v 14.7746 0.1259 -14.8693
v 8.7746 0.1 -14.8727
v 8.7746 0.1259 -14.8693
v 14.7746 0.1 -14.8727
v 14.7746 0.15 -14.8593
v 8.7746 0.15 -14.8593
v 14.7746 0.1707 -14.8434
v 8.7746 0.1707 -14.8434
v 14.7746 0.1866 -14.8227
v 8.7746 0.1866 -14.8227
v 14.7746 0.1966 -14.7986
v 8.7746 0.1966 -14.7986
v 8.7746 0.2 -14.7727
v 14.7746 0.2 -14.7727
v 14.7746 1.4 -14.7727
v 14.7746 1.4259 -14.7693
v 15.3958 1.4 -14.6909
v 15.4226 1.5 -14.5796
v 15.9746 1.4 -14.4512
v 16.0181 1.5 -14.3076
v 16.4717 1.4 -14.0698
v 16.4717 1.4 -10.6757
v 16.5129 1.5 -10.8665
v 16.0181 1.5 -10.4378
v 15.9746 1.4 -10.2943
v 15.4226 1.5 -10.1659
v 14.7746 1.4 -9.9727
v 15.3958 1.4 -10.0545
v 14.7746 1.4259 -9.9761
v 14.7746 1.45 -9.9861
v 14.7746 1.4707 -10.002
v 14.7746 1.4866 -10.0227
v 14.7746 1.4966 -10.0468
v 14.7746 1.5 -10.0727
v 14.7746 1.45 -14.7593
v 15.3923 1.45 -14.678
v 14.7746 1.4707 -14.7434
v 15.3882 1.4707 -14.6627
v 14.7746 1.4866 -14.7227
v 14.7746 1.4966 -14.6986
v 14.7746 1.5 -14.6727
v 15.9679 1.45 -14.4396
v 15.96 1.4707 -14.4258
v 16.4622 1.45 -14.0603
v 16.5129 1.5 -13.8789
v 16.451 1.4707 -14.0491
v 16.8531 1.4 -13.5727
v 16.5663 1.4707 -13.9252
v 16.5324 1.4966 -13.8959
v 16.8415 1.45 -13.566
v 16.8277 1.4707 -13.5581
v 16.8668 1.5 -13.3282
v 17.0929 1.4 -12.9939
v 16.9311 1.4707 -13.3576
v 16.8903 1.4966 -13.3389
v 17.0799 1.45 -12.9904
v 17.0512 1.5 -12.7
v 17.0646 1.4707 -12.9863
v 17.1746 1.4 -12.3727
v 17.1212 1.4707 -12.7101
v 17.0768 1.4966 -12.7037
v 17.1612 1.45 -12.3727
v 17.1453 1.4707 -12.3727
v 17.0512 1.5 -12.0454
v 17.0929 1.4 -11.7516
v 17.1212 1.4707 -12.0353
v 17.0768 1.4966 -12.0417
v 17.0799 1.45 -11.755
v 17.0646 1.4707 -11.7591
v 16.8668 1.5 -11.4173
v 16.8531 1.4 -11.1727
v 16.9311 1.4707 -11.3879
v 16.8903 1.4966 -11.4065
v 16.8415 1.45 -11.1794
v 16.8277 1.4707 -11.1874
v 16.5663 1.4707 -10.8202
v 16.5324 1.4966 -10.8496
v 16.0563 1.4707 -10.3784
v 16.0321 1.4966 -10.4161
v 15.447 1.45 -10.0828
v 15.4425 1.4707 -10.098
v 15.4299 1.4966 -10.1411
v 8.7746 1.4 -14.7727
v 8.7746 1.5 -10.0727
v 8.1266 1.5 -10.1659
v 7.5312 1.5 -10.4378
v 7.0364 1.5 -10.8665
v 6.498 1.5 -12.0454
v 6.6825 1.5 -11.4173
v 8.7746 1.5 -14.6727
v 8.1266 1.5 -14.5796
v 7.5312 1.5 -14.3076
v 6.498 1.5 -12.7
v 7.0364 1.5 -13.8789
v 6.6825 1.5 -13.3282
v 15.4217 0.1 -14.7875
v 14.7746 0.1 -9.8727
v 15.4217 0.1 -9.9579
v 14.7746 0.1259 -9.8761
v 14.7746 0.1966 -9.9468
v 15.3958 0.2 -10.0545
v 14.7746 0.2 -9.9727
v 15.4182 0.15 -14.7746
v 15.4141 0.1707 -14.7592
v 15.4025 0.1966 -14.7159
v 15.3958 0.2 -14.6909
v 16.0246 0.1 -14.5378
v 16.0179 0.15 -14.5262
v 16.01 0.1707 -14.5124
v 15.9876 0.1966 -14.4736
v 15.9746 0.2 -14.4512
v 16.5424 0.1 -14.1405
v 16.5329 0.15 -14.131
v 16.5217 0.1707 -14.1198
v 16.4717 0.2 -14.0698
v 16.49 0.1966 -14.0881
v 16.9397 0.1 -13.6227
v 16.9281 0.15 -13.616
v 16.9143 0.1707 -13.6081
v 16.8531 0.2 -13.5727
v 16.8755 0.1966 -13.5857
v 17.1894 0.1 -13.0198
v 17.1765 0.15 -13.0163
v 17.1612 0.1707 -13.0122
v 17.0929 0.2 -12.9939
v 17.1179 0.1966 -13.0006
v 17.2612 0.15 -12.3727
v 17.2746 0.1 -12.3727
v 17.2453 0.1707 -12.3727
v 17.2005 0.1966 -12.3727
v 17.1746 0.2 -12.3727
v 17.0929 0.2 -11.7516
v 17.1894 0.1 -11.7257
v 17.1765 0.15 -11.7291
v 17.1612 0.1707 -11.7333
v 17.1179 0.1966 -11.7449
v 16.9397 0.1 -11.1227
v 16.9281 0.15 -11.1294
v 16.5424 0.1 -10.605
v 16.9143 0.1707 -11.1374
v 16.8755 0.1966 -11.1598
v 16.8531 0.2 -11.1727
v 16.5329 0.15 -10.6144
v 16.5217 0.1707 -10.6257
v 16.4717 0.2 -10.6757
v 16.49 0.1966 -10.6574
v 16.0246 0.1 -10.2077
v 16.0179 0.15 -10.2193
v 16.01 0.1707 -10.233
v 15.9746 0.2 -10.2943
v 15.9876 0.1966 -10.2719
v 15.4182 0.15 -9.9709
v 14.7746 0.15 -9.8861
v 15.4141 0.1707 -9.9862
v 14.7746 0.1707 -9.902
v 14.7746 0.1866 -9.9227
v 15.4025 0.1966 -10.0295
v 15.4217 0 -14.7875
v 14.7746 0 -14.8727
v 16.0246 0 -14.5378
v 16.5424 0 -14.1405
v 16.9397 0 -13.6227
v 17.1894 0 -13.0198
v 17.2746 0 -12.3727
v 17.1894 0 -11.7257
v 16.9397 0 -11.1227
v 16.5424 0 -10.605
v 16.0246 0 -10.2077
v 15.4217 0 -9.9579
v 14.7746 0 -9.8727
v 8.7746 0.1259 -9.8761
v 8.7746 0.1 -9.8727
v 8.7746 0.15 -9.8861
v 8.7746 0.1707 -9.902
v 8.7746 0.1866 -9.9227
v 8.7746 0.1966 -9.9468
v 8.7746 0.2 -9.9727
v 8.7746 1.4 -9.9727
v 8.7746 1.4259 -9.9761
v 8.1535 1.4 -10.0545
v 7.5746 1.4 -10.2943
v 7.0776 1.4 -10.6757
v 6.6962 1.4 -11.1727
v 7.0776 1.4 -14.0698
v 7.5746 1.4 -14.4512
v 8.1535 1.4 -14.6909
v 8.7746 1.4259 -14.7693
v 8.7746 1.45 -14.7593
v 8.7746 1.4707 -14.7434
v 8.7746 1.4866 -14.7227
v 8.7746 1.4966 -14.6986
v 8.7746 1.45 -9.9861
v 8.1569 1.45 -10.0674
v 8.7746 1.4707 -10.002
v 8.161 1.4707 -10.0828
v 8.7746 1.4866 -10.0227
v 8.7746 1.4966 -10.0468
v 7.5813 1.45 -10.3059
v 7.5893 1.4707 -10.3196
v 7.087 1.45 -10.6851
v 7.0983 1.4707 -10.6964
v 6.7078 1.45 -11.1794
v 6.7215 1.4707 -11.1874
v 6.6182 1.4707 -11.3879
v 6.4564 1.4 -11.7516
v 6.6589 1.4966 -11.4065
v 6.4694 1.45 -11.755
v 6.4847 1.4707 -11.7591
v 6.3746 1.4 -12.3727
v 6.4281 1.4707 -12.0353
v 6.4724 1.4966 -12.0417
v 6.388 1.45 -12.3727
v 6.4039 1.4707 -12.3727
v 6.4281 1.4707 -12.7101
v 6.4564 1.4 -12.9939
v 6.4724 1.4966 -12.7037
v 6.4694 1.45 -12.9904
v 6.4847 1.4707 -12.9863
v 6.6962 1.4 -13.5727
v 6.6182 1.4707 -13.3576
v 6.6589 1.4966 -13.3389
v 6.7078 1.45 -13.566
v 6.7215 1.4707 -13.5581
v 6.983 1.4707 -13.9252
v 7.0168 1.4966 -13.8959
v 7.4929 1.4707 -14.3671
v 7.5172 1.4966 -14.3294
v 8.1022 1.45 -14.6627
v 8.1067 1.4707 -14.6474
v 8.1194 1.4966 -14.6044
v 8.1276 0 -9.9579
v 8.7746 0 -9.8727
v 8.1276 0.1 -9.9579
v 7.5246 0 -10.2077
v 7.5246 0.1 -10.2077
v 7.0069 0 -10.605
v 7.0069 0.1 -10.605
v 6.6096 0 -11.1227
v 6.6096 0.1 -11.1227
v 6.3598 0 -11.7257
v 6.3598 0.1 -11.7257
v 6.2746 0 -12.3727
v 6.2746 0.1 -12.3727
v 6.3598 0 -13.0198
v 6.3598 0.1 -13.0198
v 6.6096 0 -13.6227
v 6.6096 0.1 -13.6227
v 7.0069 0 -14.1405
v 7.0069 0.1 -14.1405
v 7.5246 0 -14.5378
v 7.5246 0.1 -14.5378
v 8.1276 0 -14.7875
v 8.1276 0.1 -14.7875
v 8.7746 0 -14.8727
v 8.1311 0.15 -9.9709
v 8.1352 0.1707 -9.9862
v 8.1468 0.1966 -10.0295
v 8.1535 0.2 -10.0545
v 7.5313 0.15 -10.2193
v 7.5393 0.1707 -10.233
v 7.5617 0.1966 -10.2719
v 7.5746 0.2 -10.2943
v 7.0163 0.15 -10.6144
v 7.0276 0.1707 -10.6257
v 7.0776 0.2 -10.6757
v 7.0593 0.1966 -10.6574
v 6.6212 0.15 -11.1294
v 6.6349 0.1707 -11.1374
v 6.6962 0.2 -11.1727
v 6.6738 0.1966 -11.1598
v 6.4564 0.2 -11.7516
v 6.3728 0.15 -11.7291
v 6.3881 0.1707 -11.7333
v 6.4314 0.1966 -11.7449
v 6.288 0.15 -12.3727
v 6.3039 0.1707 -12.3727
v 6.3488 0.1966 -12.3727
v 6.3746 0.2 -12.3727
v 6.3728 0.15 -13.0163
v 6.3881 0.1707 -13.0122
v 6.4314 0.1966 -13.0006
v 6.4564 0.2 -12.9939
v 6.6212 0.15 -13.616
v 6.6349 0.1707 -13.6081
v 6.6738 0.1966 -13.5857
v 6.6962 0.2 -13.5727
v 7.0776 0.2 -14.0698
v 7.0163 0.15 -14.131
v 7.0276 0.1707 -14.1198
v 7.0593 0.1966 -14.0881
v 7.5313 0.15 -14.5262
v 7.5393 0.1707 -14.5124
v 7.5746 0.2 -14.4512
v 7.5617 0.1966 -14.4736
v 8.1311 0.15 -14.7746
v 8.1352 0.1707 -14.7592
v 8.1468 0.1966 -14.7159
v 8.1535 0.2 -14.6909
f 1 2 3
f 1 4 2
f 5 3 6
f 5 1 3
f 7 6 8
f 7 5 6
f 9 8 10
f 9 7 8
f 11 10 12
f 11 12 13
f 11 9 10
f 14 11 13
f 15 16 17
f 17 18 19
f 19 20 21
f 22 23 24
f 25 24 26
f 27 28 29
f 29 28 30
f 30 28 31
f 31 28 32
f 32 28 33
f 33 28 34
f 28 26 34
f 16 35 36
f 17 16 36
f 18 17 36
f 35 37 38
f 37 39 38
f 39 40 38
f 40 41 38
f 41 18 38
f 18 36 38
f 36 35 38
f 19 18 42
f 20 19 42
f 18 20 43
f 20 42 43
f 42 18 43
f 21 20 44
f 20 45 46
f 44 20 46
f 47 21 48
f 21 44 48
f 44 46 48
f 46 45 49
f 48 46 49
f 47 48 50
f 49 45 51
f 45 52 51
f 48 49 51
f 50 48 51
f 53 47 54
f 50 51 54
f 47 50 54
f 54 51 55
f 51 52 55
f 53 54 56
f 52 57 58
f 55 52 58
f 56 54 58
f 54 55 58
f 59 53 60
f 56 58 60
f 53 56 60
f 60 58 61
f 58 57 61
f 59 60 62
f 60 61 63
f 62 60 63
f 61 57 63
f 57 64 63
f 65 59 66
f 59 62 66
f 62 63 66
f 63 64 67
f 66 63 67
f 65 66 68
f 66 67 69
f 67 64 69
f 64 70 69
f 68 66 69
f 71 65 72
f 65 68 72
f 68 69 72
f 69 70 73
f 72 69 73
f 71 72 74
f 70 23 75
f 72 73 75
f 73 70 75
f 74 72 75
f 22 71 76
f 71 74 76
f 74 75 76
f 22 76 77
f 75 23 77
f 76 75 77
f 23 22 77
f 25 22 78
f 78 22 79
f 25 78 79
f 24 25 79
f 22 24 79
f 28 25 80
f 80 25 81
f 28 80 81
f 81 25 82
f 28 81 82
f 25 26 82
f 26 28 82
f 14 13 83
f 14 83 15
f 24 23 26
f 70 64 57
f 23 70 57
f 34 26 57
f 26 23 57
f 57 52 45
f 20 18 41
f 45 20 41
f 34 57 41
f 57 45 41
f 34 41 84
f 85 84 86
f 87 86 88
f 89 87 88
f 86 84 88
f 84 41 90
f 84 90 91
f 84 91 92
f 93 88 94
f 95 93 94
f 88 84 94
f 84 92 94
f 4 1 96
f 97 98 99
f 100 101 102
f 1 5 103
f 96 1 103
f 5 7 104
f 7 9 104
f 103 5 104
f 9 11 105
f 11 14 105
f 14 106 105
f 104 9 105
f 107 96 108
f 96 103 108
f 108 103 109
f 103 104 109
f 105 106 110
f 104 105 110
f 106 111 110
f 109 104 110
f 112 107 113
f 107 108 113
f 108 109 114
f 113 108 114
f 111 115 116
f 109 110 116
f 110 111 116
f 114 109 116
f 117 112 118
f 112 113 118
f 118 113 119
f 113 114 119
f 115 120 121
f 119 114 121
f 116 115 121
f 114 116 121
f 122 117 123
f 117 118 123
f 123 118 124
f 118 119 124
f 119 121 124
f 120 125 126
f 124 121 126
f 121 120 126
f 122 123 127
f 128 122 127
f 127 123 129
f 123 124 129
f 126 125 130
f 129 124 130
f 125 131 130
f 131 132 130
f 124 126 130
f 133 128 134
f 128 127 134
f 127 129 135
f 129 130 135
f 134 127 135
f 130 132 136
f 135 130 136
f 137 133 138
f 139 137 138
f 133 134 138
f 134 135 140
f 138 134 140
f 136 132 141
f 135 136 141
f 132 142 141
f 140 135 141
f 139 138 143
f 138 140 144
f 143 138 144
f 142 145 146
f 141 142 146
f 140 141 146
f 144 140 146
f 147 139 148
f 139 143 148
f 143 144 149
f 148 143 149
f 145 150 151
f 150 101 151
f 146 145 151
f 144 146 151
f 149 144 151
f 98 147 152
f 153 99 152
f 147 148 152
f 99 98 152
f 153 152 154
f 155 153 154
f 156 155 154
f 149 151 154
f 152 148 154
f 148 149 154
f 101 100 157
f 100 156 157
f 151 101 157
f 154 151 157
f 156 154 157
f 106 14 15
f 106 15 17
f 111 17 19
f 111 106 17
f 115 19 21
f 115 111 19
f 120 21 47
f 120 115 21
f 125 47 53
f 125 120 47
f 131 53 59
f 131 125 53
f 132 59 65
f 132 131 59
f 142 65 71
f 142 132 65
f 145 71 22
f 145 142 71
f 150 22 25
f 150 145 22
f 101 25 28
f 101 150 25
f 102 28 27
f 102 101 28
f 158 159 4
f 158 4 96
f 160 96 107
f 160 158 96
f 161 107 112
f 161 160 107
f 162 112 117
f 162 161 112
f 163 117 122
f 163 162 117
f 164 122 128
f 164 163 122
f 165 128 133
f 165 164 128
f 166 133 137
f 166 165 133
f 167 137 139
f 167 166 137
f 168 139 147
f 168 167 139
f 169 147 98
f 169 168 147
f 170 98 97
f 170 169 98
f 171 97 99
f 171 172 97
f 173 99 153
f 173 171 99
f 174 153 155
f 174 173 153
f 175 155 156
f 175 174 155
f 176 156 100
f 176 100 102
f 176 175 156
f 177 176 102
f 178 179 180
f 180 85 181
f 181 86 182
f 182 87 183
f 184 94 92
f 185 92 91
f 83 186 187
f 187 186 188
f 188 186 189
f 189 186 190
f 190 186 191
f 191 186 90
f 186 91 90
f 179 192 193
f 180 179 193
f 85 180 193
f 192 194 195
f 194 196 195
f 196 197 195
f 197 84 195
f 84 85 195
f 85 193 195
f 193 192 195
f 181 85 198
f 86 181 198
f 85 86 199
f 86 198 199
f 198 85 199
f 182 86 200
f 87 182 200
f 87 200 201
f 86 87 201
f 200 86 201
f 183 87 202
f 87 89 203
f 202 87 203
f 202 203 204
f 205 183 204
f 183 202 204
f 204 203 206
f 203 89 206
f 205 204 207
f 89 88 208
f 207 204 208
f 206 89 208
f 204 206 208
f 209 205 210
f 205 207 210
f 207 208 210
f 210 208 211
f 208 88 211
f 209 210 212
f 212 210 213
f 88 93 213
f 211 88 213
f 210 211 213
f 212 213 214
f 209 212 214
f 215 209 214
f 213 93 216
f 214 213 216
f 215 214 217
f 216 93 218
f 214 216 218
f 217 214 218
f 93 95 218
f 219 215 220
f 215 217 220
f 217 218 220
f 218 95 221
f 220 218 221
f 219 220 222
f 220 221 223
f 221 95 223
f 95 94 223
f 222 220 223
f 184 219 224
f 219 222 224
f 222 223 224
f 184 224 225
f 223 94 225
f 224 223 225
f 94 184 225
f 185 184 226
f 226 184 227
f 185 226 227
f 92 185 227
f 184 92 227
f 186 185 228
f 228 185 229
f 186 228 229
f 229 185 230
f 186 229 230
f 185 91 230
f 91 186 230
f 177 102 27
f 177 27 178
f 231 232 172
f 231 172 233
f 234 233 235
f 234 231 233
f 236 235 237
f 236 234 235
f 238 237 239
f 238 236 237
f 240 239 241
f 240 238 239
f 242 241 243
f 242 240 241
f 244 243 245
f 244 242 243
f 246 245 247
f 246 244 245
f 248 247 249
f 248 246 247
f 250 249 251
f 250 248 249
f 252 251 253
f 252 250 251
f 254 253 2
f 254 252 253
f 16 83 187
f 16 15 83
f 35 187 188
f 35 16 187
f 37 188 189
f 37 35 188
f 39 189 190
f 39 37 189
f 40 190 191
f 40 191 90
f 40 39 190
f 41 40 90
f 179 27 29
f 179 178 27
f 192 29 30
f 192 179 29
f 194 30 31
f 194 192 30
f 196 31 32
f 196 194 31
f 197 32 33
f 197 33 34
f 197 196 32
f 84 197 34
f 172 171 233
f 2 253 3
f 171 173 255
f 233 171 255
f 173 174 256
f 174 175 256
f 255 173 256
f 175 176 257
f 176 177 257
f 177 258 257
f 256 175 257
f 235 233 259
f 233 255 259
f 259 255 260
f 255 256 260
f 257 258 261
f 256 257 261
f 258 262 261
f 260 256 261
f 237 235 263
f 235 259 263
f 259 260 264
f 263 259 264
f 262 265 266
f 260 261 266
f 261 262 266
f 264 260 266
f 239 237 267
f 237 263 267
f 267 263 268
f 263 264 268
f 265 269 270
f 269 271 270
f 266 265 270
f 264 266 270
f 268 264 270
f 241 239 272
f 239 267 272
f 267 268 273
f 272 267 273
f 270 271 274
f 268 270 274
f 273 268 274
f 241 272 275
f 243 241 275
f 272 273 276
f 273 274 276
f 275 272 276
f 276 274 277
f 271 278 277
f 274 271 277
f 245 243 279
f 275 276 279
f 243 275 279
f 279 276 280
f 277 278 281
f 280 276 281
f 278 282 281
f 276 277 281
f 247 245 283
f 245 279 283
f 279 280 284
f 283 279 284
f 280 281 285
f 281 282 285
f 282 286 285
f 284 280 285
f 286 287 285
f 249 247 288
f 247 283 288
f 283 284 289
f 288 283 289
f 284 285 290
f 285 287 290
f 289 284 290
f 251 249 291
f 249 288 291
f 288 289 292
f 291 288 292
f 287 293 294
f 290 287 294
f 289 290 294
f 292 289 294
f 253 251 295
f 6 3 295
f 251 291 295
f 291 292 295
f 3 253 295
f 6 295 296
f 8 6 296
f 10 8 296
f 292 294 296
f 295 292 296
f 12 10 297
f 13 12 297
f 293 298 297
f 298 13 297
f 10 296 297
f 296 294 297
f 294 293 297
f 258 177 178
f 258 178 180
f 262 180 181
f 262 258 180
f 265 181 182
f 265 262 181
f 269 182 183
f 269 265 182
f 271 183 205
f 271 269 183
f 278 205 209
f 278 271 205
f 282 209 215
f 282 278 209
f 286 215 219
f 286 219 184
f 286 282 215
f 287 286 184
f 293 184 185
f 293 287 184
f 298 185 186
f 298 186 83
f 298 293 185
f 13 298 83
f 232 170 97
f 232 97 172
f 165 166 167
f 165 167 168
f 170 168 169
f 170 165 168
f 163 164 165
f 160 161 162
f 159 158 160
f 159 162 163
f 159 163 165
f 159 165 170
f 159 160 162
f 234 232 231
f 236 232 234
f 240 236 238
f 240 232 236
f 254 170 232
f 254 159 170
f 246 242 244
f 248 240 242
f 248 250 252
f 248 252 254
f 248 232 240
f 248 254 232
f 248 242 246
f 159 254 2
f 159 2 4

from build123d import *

# Parameters (mm, degrees)
BOSS_EXTRUDE1_DEPTH = 0.2
FILLET3_R           = 0.1
BOSS_EXTRUDE2_DEPTH = 1.3
FILLET4_R           = 0.1


with BuildPart() as part:
    # Sketch2 → Boss-Extrude1 (new body)
    with BuildSketch(Plane(origin=(0, 0, 0), x_dir=(1, 0, 0), z_dir=(0, 1, 0))):
        with BuildLine():
            Line((8.774632583, 14.872725815), (14.774632583, 14.872725815))
            ThreePointArc((14.774632583, 14.872725815), (17.274632583, 12.372725815), (14.774632583, 9.872725815))
            Line((14.774632583, 9.872725815), (8.774632583, 9.872725815))
            ThreePointArc((8.774632583, 9.872725815), (6.274632583, 12.372725815), (8.774632583, 14.872725815))
        make_face()
    extrude(amount=BOSS_EXTRUDE1_DEPTH)

    # Fillet3
    fillet3_edges = [part.edges().sort_by_distance(p)[0] for p in [
        (17.274632583, 0.2, -12.372725815),
        (11.774632583, 0.2, -14.872725815),
        (6.274632583, 0.2, -12.372725815),
        (11.774632583, 0.2, -9.872725815),
    ]]
    fillet(fillet3_edges, radius=FILLET3_R)

    # Sketch5 → Boss-Extrude2 (add)
    with BuildSketch(Plane(origin=(0, 0.2, 0), x_dir=(1, 0, 0), z_dir=(0, 1, 0))):
        with BuildLine():
            Line((8.774632583, 14.772725815), (14.774632583, 14.772725815))
            ThreePointArc((14.774632583, 14.772725815), (17.174632583, 12.372725815), (14.774632583, 9.972725815))
            Line((14.774632583, 9.972725815), (8.774632583, 9.972725815))
            ThreePointArc((8.774632583, 9.972725815), (6.374632583, 12.372725815), (8.774632583, 14.772725815))
        make_face()
    extrude(amount=BOSS_EXTRUDE2_DEPTH)

    # Fillet4
    fillet4_edges = [part.edges().sort_by_distance(p)[0] for p in [
        (6.374632583, 1.5, -12.372725815),
        (11.774632583, 1.5, -9.972725815),
        (17.174632583, 1.5, -12.372725815),
        (11.774632583, 1.5, -14.772725815),
    ]]
    fillet(fillet4_edges, radius=FILLET4_R)


solid = part.part
